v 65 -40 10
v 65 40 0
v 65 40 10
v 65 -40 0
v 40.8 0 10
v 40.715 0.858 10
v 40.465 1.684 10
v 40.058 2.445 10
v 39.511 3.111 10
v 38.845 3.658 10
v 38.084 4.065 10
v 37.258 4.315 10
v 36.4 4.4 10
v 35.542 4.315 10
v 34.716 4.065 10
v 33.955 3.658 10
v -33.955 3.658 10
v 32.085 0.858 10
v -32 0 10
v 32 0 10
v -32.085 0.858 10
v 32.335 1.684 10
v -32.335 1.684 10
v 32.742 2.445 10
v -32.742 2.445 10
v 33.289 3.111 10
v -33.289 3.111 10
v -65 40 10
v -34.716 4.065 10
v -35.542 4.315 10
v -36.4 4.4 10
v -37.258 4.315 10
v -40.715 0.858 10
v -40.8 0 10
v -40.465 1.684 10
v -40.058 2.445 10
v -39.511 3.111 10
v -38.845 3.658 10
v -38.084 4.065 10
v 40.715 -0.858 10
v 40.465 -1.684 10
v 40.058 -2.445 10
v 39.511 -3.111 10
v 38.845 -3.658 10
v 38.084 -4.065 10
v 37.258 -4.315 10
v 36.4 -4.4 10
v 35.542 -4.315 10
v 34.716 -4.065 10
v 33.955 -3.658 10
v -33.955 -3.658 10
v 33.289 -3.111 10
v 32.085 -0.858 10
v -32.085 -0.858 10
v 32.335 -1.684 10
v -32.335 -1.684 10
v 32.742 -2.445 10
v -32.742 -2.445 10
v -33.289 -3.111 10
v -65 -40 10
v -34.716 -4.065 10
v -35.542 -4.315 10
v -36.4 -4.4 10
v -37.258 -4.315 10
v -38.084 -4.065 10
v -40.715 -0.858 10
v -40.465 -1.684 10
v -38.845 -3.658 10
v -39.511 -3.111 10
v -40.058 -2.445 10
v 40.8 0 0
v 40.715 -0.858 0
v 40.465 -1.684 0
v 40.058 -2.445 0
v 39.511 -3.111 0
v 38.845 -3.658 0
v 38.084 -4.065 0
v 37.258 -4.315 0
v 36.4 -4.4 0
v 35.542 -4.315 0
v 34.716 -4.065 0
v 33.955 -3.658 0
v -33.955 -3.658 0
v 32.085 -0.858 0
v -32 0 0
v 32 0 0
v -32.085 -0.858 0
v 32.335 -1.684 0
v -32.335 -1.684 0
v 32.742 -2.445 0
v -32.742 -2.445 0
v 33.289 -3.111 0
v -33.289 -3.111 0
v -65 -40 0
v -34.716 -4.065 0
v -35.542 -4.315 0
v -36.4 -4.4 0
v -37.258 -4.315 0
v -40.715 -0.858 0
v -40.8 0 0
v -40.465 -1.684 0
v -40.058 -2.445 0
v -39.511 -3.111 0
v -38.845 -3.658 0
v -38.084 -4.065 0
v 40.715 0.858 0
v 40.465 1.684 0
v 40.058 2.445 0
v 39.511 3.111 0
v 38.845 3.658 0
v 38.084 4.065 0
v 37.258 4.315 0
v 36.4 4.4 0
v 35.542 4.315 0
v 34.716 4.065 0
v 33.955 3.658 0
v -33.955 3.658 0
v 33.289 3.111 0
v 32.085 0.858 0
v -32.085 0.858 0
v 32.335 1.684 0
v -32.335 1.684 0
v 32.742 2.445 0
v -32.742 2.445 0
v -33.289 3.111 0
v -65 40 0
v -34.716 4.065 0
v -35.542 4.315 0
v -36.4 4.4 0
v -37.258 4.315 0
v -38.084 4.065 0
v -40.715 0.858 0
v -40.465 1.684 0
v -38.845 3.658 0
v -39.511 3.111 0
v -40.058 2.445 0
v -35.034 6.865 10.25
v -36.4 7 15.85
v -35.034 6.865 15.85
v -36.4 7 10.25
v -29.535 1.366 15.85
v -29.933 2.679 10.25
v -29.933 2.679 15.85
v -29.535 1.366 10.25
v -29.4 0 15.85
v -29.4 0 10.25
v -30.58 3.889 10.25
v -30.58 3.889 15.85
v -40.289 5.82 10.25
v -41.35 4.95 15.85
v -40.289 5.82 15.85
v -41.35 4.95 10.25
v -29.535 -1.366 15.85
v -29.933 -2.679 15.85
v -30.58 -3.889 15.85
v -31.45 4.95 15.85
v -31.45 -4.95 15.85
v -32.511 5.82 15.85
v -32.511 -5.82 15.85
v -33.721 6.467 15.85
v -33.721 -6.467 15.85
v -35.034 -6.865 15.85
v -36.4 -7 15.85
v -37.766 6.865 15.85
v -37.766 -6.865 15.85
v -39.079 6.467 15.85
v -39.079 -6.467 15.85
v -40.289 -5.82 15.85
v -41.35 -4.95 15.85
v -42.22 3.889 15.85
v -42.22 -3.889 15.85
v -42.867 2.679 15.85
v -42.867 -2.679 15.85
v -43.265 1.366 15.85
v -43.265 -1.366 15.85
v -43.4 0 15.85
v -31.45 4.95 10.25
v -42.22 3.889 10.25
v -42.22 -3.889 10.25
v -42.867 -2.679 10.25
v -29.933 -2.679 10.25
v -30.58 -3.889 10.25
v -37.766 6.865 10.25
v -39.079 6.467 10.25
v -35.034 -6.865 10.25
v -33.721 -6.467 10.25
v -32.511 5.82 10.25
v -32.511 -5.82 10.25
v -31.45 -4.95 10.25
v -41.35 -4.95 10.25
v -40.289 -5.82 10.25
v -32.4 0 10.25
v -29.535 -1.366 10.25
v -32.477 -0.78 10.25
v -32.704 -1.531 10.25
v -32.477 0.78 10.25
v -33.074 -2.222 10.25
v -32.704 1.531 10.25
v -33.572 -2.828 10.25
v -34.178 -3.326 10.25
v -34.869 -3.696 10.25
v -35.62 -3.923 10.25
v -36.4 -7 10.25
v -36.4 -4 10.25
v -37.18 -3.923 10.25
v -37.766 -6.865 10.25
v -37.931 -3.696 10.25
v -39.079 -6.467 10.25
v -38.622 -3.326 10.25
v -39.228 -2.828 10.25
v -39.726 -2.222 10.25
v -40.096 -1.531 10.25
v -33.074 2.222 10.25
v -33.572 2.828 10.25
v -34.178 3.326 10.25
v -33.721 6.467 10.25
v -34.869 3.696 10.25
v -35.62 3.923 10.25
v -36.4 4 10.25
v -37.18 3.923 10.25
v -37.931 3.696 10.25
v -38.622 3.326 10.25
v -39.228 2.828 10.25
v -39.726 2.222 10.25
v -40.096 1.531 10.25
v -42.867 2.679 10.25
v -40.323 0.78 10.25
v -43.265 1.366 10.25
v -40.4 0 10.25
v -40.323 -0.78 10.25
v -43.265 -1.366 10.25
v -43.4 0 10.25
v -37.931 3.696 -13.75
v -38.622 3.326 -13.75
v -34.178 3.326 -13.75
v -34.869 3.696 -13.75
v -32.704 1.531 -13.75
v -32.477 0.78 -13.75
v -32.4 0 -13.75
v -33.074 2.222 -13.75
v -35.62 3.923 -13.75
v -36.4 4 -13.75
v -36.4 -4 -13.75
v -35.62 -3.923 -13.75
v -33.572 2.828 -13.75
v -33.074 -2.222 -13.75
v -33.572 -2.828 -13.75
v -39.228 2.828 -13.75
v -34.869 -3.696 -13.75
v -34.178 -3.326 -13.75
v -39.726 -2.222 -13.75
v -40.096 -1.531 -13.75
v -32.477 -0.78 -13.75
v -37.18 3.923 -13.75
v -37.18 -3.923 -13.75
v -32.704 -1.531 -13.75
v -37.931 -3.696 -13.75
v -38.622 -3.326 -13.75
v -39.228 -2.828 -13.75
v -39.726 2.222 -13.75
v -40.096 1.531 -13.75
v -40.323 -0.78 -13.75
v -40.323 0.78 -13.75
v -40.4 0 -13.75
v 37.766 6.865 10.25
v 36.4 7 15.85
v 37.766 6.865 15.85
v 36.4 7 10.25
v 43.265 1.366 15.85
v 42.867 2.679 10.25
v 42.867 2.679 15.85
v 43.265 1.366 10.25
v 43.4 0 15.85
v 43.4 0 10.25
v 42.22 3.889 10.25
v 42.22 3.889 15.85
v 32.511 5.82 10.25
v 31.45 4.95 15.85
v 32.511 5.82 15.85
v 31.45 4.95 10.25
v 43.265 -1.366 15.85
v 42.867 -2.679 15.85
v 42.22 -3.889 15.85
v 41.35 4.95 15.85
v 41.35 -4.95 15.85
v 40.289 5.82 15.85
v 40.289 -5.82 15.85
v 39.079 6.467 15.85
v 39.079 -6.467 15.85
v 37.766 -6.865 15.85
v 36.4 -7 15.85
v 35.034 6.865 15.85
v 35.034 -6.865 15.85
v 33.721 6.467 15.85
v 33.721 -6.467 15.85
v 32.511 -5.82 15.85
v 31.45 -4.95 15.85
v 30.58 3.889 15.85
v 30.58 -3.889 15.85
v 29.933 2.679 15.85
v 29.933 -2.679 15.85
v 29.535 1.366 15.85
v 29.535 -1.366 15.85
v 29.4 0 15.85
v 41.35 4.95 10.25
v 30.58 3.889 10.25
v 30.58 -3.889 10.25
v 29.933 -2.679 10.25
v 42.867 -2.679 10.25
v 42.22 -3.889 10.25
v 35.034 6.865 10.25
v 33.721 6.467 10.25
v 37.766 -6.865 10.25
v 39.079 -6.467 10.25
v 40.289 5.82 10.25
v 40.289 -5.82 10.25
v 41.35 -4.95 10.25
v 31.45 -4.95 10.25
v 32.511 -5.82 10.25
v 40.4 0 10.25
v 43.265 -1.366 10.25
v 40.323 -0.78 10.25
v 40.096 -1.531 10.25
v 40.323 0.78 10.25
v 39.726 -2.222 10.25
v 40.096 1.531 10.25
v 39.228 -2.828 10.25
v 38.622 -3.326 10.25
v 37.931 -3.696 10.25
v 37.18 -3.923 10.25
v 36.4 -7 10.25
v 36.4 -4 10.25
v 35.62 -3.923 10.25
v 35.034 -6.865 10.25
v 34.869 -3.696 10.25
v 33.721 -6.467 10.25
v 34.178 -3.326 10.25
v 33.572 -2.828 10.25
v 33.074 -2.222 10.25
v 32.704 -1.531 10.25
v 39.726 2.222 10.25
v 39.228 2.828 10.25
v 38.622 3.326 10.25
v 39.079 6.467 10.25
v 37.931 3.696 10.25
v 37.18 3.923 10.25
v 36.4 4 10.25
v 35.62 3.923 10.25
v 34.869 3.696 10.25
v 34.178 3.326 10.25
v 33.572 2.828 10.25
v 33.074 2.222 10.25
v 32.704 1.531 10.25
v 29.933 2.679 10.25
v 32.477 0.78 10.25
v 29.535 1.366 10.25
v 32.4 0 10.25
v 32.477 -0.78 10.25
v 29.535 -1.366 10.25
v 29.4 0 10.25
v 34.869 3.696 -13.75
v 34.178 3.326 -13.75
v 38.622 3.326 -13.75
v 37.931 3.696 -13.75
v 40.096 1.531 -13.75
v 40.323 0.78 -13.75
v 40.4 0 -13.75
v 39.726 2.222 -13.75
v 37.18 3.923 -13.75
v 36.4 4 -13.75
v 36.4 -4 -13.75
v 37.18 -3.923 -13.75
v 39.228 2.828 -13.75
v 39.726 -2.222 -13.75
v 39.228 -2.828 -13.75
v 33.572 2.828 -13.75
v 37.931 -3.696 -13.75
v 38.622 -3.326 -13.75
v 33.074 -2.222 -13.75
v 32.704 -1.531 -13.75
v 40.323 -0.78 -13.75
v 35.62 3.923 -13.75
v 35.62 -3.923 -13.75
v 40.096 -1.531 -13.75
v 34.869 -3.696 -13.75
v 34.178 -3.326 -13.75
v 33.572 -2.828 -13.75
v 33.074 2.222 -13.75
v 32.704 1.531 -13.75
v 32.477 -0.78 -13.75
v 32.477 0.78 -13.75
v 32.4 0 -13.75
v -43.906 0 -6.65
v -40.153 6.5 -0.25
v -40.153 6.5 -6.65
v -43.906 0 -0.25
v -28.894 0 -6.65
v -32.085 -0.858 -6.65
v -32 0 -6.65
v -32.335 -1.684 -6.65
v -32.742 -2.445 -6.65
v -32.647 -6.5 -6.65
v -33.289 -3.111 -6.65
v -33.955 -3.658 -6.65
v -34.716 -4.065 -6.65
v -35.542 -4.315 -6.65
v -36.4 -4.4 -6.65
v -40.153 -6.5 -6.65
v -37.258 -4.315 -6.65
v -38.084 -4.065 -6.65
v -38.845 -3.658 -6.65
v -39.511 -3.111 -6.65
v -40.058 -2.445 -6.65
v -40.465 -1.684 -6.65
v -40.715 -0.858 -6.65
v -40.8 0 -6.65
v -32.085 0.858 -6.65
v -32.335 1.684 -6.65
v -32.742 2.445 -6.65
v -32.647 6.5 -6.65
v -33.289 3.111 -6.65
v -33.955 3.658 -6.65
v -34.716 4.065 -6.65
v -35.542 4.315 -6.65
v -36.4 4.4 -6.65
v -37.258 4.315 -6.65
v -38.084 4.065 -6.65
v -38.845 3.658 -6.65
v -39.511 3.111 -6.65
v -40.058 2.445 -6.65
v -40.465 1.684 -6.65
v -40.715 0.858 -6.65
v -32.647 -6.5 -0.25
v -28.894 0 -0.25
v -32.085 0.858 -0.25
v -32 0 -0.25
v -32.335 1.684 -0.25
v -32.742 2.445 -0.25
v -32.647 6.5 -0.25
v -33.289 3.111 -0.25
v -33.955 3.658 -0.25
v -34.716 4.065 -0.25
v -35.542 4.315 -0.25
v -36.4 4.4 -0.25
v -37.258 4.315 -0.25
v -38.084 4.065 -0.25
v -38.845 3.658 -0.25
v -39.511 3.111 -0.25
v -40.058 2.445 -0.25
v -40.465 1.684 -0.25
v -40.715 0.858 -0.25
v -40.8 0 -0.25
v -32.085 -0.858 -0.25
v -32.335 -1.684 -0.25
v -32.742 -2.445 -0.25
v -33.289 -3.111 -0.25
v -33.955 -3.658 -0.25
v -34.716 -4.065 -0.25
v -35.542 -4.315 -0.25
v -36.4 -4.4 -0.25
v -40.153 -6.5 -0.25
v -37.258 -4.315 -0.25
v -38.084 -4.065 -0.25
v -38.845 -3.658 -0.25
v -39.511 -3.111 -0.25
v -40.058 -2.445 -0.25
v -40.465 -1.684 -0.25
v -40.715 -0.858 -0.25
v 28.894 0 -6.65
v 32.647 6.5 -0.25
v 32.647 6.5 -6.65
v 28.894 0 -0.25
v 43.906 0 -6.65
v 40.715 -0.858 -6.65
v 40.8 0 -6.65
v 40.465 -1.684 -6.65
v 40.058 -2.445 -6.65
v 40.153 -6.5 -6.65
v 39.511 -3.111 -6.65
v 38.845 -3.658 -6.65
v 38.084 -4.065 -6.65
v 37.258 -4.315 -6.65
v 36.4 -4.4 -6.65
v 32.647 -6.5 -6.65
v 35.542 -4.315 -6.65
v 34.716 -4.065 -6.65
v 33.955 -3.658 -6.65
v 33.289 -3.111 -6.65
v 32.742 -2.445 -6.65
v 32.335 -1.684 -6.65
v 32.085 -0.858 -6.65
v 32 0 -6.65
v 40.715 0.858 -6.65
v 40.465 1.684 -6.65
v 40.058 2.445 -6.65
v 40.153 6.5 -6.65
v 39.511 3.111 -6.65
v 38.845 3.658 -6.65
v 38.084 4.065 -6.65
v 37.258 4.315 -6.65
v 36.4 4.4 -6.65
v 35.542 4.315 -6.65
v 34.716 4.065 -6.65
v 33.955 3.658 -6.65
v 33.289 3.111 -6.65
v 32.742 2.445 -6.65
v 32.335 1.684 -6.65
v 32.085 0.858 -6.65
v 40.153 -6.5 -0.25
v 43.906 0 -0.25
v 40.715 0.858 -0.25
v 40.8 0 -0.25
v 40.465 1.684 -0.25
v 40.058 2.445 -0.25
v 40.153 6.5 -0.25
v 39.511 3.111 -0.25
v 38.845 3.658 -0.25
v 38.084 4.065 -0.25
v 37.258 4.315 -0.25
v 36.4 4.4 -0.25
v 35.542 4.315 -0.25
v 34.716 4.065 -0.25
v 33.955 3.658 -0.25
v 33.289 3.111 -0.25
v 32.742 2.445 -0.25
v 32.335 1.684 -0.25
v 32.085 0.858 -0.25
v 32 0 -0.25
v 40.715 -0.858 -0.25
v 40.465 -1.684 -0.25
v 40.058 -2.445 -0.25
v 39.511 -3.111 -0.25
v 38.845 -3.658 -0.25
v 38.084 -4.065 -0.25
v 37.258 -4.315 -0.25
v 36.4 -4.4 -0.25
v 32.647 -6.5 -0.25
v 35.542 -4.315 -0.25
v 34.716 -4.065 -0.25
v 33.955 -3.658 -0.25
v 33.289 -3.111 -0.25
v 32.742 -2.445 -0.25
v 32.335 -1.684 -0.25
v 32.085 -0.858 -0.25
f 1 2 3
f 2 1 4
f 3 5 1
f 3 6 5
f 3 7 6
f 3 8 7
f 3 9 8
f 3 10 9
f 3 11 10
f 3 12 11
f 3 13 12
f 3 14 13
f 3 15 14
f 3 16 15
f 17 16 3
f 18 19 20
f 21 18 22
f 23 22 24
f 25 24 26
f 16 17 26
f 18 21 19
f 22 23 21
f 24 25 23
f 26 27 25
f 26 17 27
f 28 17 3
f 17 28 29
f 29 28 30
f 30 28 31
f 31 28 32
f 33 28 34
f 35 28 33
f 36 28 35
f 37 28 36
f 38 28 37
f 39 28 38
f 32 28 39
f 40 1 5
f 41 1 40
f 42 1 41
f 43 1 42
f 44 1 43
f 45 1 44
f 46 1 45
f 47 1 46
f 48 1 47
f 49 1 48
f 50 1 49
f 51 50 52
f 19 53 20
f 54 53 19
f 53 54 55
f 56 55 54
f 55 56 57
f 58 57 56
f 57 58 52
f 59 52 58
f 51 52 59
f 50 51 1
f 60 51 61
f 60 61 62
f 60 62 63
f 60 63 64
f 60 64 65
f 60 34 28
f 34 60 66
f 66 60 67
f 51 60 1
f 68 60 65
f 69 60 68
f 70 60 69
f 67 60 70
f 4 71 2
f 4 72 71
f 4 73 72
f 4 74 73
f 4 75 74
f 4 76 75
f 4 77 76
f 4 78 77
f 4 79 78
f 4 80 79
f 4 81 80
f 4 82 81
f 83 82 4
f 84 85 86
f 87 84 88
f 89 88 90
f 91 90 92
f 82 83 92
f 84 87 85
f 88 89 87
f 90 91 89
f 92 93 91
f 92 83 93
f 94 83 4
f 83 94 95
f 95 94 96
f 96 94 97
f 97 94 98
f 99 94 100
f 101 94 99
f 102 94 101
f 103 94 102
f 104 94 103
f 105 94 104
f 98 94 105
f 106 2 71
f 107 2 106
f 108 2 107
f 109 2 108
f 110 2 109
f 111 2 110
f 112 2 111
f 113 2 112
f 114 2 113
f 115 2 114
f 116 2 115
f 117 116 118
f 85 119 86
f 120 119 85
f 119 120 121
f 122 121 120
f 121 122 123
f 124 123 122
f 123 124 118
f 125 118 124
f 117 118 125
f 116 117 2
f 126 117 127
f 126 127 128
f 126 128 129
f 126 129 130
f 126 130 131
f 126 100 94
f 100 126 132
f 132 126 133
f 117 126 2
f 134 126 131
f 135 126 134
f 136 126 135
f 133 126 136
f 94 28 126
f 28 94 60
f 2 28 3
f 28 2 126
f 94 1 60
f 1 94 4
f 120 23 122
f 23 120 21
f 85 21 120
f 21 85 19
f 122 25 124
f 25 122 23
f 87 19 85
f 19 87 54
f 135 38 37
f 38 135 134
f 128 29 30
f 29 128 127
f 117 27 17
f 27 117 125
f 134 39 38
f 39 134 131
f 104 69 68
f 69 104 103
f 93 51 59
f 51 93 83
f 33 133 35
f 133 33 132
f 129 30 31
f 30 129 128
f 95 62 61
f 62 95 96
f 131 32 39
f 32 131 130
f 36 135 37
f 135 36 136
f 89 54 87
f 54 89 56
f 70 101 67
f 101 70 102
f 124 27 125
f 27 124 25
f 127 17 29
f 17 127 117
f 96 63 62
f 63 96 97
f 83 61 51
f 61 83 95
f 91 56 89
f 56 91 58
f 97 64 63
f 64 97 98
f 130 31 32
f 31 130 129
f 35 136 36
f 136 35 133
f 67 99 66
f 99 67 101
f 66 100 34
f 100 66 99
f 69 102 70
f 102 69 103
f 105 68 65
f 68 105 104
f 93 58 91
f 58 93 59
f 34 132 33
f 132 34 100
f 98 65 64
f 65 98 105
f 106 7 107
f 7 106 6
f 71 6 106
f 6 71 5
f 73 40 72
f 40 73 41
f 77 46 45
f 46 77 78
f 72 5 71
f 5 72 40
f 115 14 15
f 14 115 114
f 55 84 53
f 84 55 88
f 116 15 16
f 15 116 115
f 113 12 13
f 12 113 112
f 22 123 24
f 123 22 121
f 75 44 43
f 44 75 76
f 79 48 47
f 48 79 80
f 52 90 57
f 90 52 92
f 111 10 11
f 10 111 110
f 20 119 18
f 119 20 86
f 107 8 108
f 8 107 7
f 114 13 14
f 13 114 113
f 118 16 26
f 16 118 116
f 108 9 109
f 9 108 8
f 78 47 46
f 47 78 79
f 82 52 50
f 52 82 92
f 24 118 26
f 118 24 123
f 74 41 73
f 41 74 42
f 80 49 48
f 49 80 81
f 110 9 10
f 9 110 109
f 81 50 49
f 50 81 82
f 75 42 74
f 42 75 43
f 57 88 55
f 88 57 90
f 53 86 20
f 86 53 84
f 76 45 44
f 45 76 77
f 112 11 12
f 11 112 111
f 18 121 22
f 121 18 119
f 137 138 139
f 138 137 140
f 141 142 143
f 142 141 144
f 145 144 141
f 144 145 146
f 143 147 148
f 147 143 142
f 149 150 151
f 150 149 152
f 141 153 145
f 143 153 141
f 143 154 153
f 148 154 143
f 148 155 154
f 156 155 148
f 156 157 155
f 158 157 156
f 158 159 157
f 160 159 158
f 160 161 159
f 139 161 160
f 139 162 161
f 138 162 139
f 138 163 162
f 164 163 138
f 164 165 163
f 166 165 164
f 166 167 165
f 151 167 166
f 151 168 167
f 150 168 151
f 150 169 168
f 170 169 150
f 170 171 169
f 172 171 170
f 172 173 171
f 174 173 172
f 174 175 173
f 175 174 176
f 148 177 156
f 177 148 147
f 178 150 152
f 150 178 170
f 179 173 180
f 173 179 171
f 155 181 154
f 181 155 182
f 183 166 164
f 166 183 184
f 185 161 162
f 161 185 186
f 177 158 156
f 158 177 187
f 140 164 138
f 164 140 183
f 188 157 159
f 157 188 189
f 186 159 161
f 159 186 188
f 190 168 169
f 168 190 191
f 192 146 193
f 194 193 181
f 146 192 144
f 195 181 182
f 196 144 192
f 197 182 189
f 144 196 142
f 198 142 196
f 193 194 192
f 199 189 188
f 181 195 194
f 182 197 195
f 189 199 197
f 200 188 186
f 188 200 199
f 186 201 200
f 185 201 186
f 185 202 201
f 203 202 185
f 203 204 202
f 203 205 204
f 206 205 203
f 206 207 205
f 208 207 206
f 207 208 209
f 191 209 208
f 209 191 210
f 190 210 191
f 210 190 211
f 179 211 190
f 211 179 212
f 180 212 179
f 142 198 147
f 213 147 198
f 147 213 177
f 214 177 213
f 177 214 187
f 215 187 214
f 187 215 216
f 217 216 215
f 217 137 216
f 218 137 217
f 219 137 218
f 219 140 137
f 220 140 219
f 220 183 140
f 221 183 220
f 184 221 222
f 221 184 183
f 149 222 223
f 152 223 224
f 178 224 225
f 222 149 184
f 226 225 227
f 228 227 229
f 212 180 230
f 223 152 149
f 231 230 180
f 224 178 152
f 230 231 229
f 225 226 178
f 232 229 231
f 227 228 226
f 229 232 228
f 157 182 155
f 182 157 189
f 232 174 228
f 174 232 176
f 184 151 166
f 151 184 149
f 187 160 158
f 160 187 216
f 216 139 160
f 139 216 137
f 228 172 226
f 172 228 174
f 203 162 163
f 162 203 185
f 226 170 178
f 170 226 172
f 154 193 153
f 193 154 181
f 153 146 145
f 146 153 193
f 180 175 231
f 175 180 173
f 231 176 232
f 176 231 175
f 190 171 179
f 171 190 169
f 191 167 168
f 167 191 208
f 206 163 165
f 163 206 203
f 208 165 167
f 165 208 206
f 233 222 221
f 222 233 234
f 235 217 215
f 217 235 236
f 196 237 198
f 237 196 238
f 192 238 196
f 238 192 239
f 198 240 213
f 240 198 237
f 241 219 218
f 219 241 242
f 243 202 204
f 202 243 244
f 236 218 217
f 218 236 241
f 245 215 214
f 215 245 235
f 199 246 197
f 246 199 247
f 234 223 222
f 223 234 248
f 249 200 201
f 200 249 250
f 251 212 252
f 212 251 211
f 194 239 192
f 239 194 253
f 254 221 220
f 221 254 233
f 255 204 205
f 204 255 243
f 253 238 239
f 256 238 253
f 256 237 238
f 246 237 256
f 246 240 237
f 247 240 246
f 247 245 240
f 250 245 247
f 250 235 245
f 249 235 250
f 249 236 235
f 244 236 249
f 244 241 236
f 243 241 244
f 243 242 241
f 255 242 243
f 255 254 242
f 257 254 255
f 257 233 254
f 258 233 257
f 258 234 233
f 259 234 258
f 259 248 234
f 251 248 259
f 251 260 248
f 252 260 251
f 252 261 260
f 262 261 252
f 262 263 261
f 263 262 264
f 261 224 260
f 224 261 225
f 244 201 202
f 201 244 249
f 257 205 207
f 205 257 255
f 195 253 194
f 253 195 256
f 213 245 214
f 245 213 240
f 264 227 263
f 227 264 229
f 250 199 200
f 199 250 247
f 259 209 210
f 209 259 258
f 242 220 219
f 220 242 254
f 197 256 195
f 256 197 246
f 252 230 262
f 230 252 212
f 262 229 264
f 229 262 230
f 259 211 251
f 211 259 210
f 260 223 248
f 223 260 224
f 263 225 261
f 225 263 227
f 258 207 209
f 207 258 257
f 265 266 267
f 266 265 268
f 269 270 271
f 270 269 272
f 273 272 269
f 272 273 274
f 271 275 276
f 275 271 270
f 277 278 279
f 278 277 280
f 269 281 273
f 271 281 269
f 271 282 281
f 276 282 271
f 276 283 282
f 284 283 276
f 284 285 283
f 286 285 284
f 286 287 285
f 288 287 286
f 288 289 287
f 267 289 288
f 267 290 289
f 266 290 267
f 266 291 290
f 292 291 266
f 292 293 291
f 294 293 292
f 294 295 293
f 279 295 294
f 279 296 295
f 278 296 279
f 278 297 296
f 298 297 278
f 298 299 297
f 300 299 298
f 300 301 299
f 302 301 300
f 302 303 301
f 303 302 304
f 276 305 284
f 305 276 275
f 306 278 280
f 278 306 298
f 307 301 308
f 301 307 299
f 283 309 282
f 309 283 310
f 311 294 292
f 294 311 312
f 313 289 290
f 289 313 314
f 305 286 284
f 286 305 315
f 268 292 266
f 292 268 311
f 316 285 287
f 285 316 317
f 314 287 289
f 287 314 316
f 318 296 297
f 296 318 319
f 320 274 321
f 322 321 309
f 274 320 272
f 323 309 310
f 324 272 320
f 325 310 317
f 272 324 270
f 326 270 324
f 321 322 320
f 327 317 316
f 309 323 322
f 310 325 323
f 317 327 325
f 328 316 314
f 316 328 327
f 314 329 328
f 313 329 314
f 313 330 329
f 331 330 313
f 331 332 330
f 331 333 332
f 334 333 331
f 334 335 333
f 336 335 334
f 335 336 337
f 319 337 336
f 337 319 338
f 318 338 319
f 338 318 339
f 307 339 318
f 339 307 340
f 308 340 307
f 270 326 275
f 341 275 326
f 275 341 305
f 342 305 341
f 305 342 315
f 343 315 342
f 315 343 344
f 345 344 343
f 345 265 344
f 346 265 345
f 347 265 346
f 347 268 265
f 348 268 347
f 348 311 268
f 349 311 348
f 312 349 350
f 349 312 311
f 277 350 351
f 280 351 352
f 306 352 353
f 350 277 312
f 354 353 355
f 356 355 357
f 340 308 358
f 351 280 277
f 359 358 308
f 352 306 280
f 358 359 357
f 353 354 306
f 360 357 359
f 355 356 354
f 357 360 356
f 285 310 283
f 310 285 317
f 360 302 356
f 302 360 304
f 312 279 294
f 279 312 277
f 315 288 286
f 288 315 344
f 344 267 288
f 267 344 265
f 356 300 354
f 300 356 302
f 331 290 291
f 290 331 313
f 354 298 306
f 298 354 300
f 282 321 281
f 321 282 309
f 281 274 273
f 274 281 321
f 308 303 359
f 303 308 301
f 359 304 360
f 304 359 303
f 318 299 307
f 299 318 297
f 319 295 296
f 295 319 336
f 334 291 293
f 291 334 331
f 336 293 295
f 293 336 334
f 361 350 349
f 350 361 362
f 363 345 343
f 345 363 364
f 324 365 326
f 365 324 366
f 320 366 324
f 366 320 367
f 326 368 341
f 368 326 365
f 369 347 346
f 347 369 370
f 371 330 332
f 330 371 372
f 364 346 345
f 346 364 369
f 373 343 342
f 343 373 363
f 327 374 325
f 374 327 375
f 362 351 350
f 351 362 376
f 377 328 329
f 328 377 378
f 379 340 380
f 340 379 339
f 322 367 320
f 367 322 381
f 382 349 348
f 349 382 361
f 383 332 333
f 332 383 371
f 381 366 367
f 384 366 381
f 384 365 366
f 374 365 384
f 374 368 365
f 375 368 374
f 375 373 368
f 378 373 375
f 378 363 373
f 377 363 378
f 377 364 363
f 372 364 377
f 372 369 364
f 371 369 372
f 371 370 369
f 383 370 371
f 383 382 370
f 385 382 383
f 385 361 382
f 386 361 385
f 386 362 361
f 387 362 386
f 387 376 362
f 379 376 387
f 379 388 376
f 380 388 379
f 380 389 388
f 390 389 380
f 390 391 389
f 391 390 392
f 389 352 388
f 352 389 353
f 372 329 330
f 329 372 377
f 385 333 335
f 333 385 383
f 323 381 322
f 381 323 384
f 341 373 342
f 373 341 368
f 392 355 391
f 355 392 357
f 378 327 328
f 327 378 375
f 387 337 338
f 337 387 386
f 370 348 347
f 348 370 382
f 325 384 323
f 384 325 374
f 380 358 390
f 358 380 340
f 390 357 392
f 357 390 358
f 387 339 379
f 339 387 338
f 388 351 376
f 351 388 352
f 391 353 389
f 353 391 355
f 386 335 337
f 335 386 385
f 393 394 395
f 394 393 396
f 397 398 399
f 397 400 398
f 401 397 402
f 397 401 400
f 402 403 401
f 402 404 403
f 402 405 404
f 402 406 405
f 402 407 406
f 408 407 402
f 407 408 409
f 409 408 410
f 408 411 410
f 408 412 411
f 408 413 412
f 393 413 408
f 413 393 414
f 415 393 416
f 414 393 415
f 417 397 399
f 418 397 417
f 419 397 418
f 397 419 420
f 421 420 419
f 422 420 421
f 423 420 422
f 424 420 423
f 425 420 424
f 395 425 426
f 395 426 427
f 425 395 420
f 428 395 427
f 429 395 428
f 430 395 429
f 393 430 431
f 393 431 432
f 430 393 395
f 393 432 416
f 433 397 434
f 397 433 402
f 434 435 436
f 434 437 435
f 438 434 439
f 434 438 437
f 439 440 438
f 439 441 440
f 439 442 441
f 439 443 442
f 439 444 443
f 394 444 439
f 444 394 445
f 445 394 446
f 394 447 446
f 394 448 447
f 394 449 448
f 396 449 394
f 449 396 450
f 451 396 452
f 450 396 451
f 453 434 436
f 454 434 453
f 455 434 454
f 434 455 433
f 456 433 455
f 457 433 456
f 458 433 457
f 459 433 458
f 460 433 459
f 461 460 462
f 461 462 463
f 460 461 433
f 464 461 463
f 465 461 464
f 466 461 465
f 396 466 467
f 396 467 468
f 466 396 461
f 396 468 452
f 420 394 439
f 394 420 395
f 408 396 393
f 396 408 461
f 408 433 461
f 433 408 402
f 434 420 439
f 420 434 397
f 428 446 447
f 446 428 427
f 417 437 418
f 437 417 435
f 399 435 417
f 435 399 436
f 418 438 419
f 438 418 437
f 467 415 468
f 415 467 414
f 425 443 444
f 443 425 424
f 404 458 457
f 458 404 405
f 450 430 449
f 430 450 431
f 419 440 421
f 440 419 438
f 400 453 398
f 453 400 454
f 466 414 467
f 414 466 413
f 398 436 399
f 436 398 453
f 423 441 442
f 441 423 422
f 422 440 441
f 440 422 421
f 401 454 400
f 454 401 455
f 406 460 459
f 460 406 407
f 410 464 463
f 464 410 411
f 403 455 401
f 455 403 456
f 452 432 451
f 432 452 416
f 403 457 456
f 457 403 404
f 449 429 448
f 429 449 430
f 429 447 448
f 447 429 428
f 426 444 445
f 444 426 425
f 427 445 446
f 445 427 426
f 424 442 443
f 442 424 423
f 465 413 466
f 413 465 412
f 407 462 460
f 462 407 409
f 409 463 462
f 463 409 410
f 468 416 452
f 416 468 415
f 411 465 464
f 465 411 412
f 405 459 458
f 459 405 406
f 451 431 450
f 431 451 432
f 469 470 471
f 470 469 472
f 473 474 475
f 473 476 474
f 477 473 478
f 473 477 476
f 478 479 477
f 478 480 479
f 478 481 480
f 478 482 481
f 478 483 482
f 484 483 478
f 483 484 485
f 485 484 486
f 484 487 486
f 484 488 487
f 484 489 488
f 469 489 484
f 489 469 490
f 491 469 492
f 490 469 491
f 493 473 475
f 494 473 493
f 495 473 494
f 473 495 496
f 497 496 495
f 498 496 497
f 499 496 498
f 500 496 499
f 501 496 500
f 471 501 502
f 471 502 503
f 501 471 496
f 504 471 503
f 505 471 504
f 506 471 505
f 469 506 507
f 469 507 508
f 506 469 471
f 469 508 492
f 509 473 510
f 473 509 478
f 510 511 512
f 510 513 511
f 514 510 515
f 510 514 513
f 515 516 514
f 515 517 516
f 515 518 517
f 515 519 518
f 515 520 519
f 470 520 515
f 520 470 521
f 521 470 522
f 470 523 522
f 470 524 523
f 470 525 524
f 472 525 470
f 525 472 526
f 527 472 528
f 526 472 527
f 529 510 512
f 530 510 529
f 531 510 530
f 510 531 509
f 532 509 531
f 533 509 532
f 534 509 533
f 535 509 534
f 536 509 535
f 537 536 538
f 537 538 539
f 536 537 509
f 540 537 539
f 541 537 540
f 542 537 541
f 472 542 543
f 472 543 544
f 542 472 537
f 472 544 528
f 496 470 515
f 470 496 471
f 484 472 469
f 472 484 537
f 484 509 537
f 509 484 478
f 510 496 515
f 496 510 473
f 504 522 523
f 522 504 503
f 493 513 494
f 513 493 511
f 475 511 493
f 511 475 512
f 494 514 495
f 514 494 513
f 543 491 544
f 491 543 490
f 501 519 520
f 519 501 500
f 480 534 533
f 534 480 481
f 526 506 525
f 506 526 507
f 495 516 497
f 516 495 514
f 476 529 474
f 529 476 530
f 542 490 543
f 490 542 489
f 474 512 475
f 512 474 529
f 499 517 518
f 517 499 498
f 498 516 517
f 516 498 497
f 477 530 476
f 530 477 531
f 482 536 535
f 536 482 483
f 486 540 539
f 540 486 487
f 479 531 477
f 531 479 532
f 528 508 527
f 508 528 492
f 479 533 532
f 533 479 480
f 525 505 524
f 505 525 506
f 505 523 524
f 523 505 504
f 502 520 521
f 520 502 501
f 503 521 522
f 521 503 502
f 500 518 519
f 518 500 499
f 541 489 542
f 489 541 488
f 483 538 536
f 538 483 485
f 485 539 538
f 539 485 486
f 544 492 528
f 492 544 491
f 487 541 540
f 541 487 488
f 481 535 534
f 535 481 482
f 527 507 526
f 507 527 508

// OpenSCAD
$fn = 32;

// ------------------------------------------------------------------------
// Bolted plate: 130 x 80 x 10 mm plate, 2 fasteners
// Every part is its own module, assembly() places them once.
// ------------------------------------------------------------------------

// --- part 1 ---
module plate() {
  difference() {
    translate([-65, -40, 0]) cube([130, 80, 10]);
    translate([-36.4, 0, -1]) cylinder(h = 12, d = 8.8);
    translate([36.4, 0, -1]) cylinder(h = 12, d = 8.8);
  }
}

// --- part 2 ---
module bolt1() {
  cylinder(h = 5.6, d = 14);
  translate([0, 0, -24]) cylinder(h = 24, d = 8);
}

// --- part 3 ---
module bolt2() {
  cylinder(h = 5.6, d = 14);
  translate([0, 0, -24]) cylinder(h = 24, d = 8);
}

// --- part 4 ---
module nut1() {
  difference() {
    linear_extrude(height = 6.4) polygon(points = [[7.506, 0], [3.753, 6.5], [-3.753, 6.5], [-7.506, 0], [-3.753, -6.5], [3.753, -6.5]]);
    translate([0, 0, -1]) cylinder(h = 8.4, d = 8.8);
  }
}

// --- part 5 ---
module nut2() {
  difference() {
    linear_extrude(height = 6.4) polygon(points = [[7.506, 0], [3.753, 6.5], [-3.753, 6.5], [-7.506, 0], [-3.753, -6.5], [3.753, -6.5]]);
    translate([0, 0, -1]) cylinder(h = 8.4, d = 8.8);
  }
}

// --- assembly ---
module assembly() {
  translate([0, 0, 0]) rotate([0, 0, 0]) plate();
  translate([-36.4, 0, 10.25]) rotate([0, 0, 0]) bolt1();
  translate([36.4, 0, 10.25]) rotate([0, 0, 0]) bolt2();
  translate([-36.4, 0, -6.65]) rotate([0, 0, 0]) nut1();
  translate([36.4, 0, -6.65]) rotate([0, 0, 0]) nut2();
}

assembly();
